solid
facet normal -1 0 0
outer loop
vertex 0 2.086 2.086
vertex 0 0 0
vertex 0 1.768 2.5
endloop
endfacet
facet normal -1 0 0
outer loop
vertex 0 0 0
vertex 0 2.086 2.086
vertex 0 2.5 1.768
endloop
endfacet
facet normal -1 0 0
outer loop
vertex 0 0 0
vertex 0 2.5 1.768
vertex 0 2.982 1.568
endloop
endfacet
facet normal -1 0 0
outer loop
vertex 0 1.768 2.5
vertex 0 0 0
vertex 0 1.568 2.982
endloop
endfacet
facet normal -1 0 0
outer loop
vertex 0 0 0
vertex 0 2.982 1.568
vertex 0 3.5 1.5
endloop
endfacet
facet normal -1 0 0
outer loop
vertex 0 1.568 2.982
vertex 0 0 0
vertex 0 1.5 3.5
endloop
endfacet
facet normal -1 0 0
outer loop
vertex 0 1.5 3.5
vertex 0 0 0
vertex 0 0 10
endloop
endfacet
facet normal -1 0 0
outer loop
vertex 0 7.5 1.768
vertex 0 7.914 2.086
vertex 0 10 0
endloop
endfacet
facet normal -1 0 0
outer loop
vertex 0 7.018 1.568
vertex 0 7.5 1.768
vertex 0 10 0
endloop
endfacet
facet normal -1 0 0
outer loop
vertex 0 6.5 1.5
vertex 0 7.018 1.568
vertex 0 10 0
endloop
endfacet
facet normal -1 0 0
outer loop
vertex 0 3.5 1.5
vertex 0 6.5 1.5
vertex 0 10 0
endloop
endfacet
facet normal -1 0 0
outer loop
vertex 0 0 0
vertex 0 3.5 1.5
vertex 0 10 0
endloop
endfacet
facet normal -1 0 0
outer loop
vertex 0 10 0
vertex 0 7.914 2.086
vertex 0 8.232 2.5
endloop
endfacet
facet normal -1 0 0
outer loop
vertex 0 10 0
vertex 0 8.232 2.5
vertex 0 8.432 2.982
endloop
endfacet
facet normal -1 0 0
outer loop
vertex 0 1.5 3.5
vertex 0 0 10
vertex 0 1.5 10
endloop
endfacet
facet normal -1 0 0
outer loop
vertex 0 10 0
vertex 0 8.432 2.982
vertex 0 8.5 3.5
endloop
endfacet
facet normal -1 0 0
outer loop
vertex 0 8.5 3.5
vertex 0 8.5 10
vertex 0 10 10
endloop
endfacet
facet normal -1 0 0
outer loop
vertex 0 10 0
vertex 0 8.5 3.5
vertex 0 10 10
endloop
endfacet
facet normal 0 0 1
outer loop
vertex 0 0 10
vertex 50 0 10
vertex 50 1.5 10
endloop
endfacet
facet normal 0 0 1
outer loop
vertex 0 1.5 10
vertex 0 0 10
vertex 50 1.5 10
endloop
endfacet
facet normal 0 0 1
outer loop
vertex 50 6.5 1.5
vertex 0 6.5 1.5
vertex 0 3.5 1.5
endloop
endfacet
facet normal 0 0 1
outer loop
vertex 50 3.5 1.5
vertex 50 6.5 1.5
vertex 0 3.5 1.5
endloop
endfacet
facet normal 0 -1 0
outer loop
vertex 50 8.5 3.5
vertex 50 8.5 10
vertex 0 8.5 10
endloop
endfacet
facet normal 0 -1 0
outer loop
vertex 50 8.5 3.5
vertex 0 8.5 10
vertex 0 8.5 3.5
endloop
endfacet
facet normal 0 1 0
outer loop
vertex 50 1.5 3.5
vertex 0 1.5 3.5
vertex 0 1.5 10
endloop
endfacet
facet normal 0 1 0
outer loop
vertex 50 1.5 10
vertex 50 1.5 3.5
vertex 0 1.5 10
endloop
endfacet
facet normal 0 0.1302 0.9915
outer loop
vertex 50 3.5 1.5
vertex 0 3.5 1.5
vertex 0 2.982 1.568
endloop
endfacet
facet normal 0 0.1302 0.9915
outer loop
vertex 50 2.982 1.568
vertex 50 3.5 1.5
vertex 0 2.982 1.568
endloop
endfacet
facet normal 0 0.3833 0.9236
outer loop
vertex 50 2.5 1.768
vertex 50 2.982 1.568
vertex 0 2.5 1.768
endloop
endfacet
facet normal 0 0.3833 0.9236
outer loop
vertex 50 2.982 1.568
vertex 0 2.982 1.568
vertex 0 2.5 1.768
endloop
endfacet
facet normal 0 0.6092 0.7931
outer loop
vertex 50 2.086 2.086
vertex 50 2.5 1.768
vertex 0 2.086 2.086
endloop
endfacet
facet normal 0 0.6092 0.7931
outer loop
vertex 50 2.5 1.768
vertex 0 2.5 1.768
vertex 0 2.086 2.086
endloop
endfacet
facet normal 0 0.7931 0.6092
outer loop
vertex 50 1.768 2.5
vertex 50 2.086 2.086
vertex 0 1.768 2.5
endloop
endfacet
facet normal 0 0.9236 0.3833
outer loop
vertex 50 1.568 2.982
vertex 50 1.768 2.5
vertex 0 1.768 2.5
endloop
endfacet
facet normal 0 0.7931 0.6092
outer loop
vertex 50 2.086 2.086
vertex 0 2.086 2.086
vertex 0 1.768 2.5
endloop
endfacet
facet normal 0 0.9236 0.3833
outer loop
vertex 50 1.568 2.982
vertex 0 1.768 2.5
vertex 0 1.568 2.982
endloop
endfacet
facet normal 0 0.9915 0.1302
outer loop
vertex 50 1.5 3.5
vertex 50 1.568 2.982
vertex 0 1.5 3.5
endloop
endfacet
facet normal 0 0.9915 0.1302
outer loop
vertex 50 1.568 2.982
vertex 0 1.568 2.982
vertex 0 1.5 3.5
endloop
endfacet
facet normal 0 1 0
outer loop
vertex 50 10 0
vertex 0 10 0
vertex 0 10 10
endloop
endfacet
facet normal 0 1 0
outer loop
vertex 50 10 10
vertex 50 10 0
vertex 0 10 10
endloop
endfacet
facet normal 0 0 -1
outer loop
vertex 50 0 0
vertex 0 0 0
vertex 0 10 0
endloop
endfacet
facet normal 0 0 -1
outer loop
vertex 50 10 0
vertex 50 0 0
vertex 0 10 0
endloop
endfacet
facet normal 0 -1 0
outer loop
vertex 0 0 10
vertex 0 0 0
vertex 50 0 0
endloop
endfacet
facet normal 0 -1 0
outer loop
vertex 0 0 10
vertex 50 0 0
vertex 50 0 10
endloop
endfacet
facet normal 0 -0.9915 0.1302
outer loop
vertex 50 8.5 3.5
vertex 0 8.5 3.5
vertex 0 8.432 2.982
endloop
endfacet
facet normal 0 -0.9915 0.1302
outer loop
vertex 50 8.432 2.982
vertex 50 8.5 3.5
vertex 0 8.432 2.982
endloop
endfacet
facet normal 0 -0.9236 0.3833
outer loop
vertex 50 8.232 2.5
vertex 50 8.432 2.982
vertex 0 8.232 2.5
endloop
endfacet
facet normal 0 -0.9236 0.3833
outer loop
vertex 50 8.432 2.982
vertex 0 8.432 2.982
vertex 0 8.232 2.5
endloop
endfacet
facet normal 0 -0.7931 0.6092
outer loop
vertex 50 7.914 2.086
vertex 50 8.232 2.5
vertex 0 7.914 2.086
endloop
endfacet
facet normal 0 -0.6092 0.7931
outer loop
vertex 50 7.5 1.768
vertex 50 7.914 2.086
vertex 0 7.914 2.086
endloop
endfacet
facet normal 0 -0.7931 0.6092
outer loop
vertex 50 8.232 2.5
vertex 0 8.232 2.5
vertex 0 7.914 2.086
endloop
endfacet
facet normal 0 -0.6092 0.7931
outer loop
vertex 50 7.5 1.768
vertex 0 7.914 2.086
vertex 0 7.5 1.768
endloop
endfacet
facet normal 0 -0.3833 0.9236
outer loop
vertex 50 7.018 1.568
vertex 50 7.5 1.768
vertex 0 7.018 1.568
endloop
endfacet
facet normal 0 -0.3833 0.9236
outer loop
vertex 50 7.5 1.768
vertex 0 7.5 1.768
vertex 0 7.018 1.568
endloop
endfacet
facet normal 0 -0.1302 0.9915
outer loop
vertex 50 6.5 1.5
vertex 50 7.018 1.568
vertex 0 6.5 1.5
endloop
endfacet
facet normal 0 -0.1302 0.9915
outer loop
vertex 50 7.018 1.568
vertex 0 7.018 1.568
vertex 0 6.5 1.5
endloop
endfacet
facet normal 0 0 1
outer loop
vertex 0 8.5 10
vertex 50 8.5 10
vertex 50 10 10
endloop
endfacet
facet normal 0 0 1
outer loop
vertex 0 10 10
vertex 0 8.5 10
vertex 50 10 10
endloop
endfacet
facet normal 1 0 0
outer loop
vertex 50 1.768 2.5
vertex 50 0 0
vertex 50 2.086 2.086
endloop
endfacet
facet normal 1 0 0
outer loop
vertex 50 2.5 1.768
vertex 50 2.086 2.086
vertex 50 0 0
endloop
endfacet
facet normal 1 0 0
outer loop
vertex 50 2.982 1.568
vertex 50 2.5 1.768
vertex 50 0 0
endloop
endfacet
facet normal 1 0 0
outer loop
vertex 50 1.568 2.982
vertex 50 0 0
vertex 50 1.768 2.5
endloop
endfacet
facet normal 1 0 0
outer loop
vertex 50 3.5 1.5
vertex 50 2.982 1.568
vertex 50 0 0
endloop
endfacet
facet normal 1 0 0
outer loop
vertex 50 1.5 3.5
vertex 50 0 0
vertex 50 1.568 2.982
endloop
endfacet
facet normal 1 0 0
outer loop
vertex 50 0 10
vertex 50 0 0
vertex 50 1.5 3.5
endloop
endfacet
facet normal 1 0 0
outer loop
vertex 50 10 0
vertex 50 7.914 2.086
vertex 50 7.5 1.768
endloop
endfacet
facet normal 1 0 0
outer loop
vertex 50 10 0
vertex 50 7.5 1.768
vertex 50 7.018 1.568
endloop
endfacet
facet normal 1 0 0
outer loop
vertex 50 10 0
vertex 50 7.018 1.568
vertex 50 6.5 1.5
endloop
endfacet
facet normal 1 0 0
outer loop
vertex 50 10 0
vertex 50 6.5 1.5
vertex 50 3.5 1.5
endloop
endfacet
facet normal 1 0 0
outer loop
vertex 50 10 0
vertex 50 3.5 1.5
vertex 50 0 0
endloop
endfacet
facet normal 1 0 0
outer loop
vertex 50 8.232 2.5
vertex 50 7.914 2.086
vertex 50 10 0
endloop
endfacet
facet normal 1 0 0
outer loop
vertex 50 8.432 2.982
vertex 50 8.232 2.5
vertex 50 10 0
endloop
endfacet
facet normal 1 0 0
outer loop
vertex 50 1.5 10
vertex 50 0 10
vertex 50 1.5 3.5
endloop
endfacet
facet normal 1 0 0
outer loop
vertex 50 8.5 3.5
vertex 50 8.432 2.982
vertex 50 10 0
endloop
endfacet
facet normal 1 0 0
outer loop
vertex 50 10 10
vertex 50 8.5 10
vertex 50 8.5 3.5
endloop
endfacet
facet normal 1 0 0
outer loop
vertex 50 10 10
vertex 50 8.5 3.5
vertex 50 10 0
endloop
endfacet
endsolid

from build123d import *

# Parameters (mm, degrees)
SKETCH_W     = 10
SKETCH_H     = 10
PAD_DEPTH    = 50
POCKET_DEPTH = 50.001


with BuildPart() as part:
    # Sketch → Pad (new body)
    with BuildSketch(Plane.YZ):
        with Locations((5, 5)):
            Rectangle(SKETCH_W, SKETCH_H)
    extrude(amount=PAD_DEPTH)

    # Sketch001 (on Face5 of Pad) → Pocket (cut, through all)
    with BuildSketch(Plane(origin=(0, 0, 0), x_dir=(0, 1, 0), z_dir=(-1, 0, 0))):
        with BuildLine():
            Line((8.5, -10), (8.5, -3.5))
            ThreePointArc((8.5, -3.5), (7.914214, -2.085786), (6.5, -1.5))
            Line((6.5, -1.5), (3.5, -1.5))
            ThreePointArc((3.5, -1.5), (2.085786, -2.085786), (1.5, -3.5))
            Line((1.5, -3.5), (1.5, -10))
            Line((1.5, -10), (8.5, -10))
        make_face()
    extrude(amount=-POCKET_DEPTH, mode=Mode.SUBTRACT)


solid = part.part
